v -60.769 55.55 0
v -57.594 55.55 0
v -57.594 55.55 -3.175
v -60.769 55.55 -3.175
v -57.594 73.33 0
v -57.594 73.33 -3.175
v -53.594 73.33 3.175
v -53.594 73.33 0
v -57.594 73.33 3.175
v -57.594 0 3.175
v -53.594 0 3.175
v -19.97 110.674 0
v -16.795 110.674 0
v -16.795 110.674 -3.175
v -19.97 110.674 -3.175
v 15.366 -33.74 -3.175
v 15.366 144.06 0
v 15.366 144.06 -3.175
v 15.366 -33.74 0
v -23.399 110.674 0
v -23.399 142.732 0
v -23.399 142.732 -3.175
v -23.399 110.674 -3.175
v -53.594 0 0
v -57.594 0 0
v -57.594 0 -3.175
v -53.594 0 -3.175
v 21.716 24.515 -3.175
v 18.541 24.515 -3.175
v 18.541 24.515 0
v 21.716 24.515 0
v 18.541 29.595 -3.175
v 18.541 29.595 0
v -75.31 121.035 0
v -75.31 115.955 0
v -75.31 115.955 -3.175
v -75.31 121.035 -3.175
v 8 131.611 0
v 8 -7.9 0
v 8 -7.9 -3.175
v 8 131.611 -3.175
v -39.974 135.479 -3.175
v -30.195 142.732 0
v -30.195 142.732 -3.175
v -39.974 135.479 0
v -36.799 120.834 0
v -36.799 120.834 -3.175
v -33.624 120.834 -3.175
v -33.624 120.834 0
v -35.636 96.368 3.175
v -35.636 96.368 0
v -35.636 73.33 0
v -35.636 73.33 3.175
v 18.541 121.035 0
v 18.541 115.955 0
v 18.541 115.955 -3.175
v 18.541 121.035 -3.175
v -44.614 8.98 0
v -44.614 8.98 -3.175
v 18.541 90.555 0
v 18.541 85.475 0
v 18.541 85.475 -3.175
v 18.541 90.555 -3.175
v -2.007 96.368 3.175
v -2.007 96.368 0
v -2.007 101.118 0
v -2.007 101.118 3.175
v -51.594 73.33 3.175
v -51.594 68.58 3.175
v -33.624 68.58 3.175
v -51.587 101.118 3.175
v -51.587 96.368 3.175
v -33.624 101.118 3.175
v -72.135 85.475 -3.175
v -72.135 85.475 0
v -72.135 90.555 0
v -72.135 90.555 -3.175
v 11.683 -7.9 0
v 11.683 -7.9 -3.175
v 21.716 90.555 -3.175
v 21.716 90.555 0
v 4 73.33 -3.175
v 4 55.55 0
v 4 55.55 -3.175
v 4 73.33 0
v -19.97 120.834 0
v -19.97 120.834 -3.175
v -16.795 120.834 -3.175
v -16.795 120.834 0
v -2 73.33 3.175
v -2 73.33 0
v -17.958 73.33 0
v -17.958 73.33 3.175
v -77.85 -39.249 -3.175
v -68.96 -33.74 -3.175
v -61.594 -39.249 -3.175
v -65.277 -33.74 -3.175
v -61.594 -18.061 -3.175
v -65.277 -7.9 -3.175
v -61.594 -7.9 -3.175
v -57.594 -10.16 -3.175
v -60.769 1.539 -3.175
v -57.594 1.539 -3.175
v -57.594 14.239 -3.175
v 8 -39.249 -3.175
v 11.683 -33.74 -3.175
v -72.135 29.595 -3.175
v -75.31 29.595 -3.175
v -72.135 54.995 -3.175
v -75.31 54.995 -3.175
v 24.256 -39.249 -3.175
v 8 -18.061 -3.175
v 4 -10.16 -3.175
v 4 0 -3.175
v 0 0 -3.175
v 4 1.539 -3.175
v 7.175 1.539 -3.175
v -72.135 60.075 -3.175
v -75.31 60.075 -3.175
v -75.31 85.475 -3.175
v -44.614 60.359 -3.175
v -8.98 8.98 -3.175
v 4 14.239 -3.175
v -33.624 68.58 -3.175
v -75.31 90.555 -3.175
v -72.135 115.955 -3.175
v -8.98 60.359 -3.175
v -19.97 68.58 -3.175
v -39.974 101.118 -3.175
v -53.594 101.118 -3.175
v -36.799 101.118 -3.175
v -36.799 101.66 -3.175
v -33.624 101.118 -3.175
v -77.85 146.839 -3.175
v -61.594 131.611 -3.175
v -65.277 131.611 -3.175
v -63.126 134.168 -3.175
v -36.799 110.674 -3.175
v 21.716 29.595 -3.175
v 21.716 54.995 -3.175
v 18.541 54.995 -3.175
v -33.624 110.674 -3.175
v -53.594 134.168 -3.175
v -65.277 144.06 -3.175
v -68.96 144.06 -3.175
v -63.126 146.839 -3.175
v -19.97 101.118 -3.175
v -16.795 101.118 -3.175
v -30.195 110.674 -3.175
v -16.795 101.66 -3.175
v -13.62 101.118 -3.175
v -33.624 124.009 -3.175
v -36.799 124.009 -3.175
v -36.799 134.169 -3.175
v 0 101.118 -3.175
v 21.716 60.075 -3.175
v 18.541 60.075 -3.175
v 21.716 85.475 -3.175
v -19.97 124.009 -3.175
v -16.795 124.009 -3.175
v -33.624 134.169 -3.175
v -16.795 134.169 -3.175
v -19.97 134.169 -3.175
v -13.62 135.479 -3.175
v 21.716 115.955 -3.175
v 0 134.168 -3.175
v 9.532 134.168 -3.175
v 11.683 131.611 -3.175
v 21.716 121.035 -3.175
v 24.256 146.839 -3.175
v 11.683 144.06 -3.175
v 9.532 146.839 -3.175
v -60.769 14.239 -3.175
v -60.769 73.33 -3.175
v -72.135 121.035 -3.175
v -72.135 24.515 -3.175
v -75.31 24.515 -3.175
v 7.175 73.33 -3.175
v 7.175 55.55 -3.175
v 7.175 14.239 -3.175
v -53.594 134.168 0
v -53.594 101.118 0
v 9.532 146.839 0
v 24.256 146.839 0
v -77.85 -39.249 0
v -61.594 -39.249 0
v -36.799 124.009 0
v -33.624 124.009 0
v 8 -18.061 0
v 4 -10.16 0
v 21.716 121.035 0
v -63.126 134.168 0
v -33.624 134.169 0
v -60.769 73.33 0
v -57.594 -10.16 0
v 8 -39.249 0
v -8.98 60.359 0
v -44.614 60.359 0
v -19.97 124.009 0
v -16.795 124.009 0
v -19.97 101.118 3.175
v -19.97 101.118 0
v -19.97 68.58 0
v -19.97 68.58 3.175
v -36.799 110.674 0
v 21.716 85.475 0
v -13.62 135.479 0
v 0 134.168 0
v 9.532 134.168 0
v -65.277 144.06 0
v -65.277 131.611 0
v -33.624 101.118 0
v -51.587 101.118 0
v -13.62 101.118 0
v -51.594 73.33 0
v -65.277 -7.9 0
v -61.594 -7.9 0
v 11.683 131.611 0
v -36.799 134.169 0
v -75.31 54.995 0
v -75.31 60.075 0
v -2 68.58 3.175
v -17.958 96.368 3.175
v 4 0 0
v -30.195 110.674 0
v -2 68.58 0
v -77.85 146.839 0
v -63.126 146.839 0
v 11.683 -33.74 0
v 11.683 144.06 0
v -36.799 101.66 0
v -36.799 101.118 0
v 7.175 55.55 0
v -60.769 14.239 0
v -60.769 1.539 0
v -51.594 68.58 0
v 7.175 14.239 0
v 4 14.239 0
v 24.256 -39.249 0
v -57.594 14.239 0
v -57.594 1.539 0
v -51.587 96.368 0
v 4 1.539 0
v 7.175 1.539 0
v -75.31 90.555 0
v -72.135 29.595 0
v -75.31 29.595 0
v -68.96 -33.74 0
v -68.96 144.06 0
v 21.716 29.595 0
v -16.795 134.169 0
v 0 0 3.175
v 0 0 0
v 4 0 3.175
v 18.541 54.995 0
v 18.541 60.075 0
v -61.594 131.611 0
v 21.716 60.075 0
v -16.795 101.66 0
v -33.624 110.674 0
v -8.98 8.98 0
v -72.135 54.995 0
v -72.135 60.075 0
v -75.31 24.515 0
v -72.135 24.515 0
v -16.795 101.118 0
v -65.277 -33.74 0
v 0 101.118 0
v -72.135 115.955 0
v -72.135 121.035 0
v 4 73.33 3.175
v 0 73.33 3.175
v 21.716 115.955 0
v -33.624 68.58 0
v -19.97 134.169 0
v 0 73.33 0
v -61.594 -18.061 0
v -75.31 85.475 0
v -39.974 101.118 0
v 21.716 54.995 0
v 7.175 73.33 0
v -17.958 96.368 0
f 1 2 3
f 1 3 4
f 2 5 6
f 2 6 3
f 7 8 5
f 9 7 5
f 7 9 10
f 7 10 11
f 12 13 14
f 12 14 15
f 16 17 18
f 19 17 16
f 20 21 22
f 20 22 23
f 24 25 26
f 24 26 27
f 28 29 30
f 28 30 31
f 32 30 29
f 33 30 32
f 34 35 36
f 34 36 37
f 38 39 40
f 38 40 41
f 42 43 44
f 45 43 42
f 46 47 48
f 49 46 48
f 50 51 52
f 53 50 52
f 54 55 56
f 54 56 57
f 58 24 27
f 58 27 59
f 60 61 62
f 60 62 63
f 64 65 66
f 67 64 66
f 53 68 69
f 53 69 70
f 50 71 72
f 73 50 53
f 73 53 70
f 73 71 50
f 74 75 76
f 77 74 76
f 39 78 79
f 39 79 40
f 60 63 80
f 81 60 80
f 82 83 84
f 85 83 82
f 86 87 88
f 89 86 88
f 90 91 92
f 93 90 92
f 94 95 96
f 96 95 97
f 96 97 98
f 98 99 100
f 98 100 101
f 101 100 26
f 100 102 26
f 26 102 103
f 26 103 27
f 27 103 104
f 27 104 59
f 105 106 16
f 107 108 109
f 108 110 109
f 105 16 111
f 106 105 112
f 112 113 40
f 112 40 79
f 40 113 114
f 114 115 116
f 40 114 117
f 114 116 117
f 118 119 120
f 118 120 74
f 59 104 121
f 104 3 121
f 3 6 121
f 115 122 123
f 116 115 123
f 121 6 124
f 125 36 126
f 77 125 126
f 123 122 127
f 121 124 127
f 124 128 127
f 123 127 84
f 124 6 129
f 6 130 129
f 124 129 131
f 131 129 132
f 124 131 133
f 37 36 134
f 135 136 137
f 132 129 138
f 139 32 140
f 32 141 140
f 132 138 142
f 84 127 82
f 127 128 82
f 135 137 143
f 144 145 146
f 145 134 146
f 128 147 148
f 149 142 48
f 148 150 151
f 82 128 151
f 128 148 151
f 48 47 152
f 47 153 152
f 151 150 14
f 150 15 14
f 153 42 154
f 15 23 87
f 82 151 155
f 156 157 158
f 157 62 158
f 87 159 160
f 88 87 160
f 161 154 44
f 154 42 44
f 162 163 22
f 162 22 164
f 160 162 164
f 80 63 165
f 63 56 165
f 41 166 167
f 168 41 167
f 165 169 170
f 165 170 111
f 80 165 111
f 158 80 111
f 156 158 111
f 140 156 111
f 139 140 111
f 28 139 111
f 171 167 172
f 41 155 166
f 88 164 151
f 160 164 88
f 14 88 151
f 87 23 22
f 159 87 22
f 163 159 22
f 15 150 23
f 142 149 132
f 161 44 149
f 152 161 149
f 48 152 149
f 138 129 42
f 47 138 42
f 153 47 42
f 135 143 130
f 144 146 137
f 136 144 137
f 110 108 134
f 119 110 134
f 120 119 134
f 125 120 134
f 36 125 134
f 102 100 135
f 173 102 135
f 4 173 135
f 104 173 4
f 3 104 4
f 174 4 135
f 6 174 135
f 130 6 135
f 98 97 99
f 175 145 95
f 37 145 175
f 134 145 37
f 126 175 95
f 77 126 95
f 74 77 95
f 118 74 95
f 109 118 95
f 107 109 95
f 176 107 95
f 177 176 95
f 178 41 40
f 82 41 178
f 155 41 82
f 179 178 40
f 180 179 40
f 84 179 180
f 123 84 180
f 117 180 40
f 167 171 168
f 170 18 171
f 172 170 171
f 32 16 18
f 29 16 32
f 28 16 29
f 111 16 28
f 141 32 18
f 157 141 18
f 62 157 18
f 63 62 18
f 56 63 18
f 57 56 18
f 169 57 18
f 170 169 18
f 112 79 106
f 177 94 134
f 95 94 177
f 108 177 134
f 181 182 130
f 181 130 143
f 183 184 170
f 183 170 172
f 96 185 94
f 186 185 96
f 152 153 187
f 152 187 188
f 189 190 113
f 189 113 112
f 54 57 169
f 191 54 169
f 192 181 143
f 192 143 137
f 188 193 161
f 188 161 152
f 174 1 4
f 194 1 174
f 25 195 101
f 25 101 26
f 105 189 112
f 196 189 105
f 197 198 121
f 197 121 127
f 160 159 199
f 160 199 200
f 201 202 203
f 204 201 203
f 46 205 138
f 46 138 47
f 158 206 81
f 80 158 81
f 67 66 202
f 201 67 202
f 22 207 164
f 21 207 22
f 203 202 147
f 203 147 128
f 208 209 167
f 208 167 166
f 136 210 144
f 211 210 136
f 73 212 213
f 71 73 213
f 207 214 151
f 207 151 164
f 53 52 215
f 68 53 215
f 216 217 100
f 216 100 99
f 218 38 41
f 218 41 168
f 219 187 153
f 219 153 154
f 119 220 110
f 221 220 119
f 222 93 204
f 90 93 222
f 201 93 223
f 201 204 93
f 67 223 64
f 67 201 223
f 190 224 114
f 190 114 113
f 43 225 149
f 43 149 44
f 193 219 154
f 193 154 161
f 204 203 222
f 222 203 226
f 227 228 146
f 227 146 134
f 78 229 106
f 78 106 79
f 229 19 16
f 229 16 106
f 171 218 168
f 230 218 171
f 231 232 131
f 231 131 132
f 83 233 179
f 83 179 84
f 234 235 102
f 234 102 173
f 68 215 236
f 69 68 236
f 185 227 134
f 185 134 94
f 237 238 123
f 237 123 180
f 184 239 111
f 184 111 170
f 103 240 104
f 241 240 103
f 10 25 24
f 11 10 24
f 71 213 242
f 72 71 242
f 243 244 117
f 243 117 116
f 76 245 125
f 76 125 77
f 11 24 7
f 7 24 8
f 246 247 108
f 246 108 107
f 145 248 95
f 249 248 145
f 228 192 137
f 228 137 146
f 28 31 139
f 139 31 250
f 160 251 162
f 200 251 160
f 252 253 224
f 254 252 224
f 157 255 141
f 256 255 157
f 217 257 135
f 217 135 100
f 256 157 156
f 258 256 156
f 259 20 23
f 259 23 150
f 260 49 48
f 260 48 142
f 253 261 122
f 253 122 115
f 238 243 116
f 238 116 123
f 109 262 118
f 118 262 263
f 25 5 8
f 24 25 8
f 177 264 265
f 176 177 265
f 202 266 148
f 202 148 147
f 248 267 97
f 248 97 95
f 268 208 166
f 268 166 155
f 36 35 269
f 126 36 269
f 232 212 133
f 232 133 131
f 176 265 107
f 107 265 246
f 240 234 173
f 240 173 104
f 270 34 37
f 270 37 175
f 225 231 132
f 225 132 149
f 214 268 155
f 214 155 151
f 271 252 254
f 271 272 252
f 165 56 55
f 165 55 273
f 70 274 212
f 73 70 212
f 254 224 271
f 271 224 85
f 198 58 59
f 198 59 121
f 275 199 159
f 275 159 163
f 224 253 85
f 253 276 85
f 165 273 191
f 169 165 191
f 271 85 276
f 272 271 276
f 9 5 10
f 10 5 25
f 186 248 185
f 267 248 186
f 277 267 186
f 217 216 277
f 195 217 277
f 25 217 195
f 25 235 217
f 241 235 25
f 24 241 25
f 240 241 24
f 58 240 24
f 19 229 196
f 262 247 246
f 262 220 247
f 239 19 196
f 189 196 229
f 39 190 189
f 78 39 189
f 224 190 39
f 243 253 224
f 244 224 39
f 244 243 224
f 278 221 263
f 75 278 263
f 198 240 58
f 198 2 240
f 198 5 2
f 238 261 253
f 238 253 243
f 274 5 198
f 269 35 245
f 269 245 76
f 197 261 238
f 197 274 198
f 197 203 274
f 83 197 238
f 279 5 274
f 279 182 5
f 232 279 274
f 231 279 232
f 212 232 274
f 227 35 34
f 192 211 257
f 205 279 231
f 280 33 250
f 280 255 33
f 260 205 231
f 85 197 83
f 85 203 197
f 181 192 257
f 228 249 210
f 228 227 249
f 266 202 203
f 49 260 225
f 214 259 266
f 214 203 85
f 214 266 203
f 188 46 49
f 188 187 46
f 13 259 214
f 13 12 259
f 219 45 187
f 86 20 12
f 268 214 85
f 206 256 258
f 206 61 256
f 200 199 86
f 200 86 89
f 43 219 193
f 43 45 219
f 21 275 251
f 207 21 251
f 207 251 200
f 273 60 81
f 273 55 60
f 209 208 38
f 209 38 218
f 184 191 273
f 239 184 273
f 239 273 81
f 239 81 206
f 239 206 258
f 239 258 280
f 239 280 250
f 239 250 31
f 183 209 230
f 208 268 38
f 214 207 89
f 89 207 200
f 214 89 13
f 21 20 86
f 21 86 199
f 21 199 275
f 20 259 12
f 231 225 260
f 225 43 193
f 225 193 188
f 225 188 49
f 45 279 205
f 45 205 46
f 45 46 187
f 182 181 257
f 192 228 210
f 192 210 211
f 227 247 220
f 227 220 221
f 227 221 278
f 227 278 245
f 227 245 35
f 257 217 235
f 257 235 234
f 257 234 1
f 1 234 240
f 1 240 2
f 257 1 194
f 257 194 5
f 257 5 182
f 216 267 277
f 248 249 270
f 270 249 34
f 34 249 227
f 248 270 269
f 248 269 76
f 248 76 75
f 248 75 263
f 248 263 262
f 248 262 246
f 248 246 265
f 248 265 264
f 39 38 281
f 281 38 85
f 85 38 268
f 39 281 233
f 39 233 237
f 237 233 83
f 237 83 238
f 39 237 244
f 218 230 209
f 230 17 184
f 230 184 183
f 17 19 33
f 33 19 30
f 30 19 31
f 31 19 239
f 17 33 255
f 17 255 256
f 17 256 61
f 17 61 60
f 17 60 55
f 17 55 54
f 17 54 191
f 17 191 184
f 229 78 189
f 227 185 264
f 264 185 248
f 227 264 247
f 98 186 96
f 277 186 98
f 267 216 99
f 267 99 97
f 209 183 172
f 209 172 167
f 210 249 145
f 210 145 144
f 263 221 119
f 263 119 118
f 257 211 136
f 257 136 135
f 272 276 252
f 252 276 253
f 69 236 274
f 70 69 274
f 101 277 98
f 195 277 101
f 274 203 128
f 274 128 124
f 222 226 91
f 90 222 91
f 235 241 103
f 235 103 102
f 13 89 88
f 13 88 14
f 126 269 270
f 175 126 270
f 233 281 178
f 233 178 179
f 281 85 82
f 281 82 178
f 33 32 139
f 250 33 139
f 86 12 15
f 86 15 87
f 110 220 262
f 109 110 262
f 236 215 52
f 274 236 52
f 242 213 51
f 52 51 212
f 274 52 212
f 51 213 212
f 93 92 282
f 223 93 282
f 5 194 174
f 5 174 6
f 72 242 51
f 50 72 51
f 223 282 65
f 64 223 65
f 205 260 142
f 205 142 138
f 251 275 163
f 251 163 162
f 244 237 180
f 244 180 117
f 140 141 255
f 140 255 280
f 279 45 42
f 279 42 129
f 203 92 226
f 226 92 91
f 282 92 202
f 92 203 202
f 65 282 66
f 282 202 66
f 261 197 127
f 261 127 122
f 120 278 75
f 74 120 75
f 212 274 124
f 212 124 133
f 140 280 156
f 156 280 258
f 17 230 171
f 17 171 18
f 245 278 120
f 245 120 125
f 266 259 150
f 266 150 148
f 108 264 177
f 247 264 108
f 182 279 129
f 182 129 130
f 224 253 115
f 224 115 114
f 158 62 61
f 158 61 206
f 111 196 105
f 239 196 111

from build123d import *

# Parameters (mm, degrees)
F0_W     = 3.175
F0_H     = 5.08
F0_W_2   = 2.0066
F0_H_2   = 4.7498
F0_W_3   = 1.999996
F0_H_3   = 4.7500032
F0_H_4   = 3.175
F1_DEPTH = 3.175
F2_DEPTH = 3.175


with BuildPart() as f1:
    # F0 (on Top) → F1 (new body)
    with BuildSketch(Plane.XY):
        Polygon((-57.593992, 73.3300032), (-53.594, 73.3300032), (-53.594, 96.3678032), (-53.594, 101.1176032), (-53.594, 134.1682225466), (-63.1263878722, 134.1682225466), (-63.1263878722, 146.8389332294), (-77.8500348, 146.8389332294), (-77.8500348, -30.2285756916), (-68.9600348, -30.2285756916), (-68.9600348, 0), (-68.9600348, 24.5148862), (-68.9600348, 144.0596636616), (-65.2770348, 144.0596636616), (-65.2770348, 131.6107958555), (-61.5940348, 131.6107958555), (-61.5940348, 73.3300032), (-60.768992, 73.3300032), align=None)
        with Locations((-73.7225348, 27.0548862)):
            Rectangle(F0_W, F0_H, mode=Mode.SUBTRACT)
        with Locations((-73.7225348, 57.5348862)):
            Rectangle(F0_W, F0_H, mode=Mode.SUBTRACT)
        with Locations((-73.7225348, 88.0148862)):
            Rectangle(F0_W, F0_H, mode=Mode.SUBTRACT)
        with Locations((-73.7225348, 118.4948862)):
            Rectangle(F0_W, F0_H, mode=Mode.SUBTRACT)
        Polygon((-53.594, 0), (-53.594, 68.58), (-53.594, 73.3300032), (-57.593992, 73.3300032), (-57.593992, 55.5500032), (-57.593992, 14.2394178), (-57.593992, 1.5394178), (-57.593992, 0), align=None)
        Polygon((-61.5940348, 0), (-57.593992, 0), (-57.593992, 1.5394178), (-60.768992, 1.5394178), (-60.768992, 14.2394178), (-57.593992, 14.2394178), (-57.593992, 55.5500032), (-60.768992, 55.5500032), (-60.768992, 73.3300032), (-61.5940348, 73.3300032), align=None)
        Polygon((-57.593992, -10.1604700894), (-57.593992, 0), (-61.5940348, -7.9003575384), (-65.2770348, -7.9003575384), (-65.2770348, -33.7403363384), (-65.2770348, -39.24895823), (-61.5940348, -39.24895823), (-61.5940348, -18.0608276278), align=None)
        Polygon((-61.5940348, -7.9003575384), (-57.593992, 0), (-61.5940348, 0), align=None)
        Polygon((-65.2770348, -39.24895823), (-65.2770348, -33.7403363384), (-68.9600348, -33.7403363384), (-68.9600348, -30.2285756916), (-77.8500348, -30.2285756916), (-77.8500348, -39.24895823), align=None)
        Polygon((-51.594004, 68.58), (-53.594, 68.58), (-53.594, 0), (-44.6137438789, 8.9802561211), (-44.6137438789, 60.3592395782), (-44.6137438789, 68.58), align=None)
        Polygon((-33.6244356733, 68.58), (-44.6137438789, 68.58), (-44.6137438789, 60.3592395782), (-26.797, 60.3592395782), (-26.797, 68.58), align=None)
        Polygon((-51.594004, 73.3300032), (-51.594004, 68.58), (-44.6137438789, 68.58), (-33.6244356733, 68.58), (-33.6244356733, 90.795443326), (-33.6244356733, 101.1176032), (-36.7994356733, 101.1176032), (-39.9744356733, 101.1176032), (-51.5874, 101.1176032), (-51.5874, 96.3678032), (-35.6362, 96.3678032), (-35.6362, 73.3300032), align=None)
        Polygon((-53.594, 96.3678032), (-53.594, 73.3300032), (-51.594004, 73.3300032), (-35.6362, 73.3300032), (-35.6362, 96.3678032), (-51.5874, 96.3678032), align=None)
        with Locations((-52.5907, 98.7427032)):
            Rectangle(F0_W_2, F0_H_2)
        with Locations((-52.594002, 70.9550016)):
            Rectangle(F0_W_3, F0_H_3)
        Polygon((-26.797, 68.58), (-26.797, 60.3592395782), (-8.9802561211, 60.3592395782), (-8.9802561211, 68.58), (-19.9695643267, 68.58), align=None)
        Polygon((-8.9802561211, 8.9802561211), (0, 0), (0, 68.58), (-1.999996, 68.58), (-8.9802561211, 68.58), (-8.9802561211, 60.3592395782), align=None)
        Polygon((-19.9695643267, 90.795443326), (-19.9695643267, 68.58), (-8.9802561211, 68.58), (-1.999996, 68.58), (-1.999996, 73.3300032), (-17.9578, 73.3300032), (-17.9578, 96.3678032), (-2.0066, 96.3678032), (-2.0066, 101.1176032), (-13.6195643267, 101.1176032), (-16.7945643267, 101.1176032), (-19.9695643267, 101.1176032), align=None)
        Polygon((-1.999996, 73.3300032), (0, 73.3300032), (0, 96.3678032), (-2.0066, 96.3678032), (-17.9578, 96.3678032), (-17.9578, 73.3300032), align=None)
        with Locations((-1.0033, 98.7427032)):
            Rectangle(F0_W_2, F0_H_2)
        with Locations((-0.999998, 70.9550016)):
            Rectangle(F0_W_3, F0_H_3)
        Polygon((0, 68.58), (0, 0), (3.999992, 0), (3.999992, 1.5394178), (3.999992, 14.2394178), (3.999992, 55.5500032), (3.999992, 73.3300032), (0, 73.3300032), align=None)
        Polygon((0, 96.3678032), (0, 73.3300032), (3.999992, 73.3300032), (7.174992, 73.3300032), (8.0000348, 73.3300032), (8.0000348, 131.6107958555), (11.6830348, 131.6107958555), (11.6830348, 144.0596636616), (15.3660348, 144.0596636616), (15.3660348, 24.5148862), (15.3660348, 0), (15.3660348, -30.2285756916), (24.2560348, -30.2285756916), (24.2560348, 146.8389332294), (9.5323878722, 146.8389332294), (9.5323878722, 134.1682225466), (0, 134.1682225466), (0, 101.1176032), align=None)
        with Locations((20.1285348, 27.0548862)):
            Rectangle(F0_W, F0_H, mode=Mode.SUBTRACT)
        with Locations((20.1285348, 57.5348862)):
            Rectangle(F0_W, F0_H, mode=Mode.SUBTRACT)
        with Locations((20.1285348, 88.0148862)):
            Rectangle(F0_W, F0_H, mode=Mode.SUBTRACT)
        with Locations((20.1285348, 118.4948862)):
            Rectangle(F0_W, F0_H, mode=Mode.SUBTRACT)
        Polygon((3.999992, 1.5394178), (3.999992, 0), (8.0000348, 0), (8.0000348, 73.3300032), (7.174992, 73.3300032), (7.174992, 55.5500032), (3.999992, 55.5500032), (3.999992, 14.2394178), (7.174992, 14.2394178), (7.174992, 1.5394178), align=None)
        Polygon((15.3660348, -33.7403363384), (11.6830348, -33.7403363384), (11.6830348, -39.24895823), (24.2560348, -39.24895823), (24.2560348, -30.2285756916), (15.3660348, -30.2285756916), align=None)
        Polygon((8.0000348, -7.9003575384), (3.999992, 0), (3.999992, -10.1604700894), (8.0000348, -18.0608276278), (8.0000348, -39.24895823), (11.6830348, -39.24895823), (11.6830348, -33.7403363384), (11.6830348, -7.9003575384), align=None)
        Polygon((8.0000348, 0), (3.999992, 0), (8.0000348, -7.9003575384), align=None)
        Polygon((-36.7994356733, 110.6742616482), (-36.7994356733, 101.6604336215), (-30.1954356733, 110.6742616482), (-33.6244356733, 110.6742616482), align=None)
        Polygon((-39.9744356733, 135.4787051678), (-39.9744356733, 101.1176032), (-36.7994356733, 101.1176032), (-36.7994356733, 101.6604336215), (-36.7994356733, 110.6742616482), (-36.7994356733, 120.8342616482), (-36.7994356733, 124.0092616482), (-36.7994356733, 134.1692616482), (-33.6244356733, 134.1692616482), (-33.6244356733, 124.0092616482), (-33.6244356733, 120.8342616482), (-33.6244356733, 110.6742616482), (-30.1954356733, 110.6742616482), (-30.1954356733, 142.732039094), align=None)
        with Locations((-35.2119356733, 122.4217616482)):
            Rectangle(F0_W, F0_H_4)
        with Locations((-18.3820643267, 122.4217616482)):
            Rectangle(F0_W, F0_H_4)
        Polygon((-16.7945643267, 101.6604336215), (-16.7945643267, 101.1176032), (-13.6195643267, 101.1176032), (-13.6195643267, 135.4787051678), (-23.3985643267, 142.732039094), (-23.3985643267, 110.6742616482), (-19.9695643267, 110.6742616482), (-19.9695643267, 120.8342616482), (-19.9695643267, 124.0092616482), (-19.9695643267, 134.1692616482), (-16.7945643267, 134.1692616482), (-16.7945643267, 124.0092616482), (-16.7945643267, 120.8342616482), (-16.7945643267, 110.6742616482), align=None)
        Polygon((-23.3985643267, 110.6742616482), (-16.7945643267, 101.6604336215), (-16.7945643267, 110.6742616482), (-19.9695643267, 110.6742616482), align=None)
    extrude(amount=-F1_DEPTH)


with BuildPart() as f2:
    # F0 (on Top) → F2 (new body)
    with BuildSketch(Plane.XY):
        Polygon((0, 68.58), (0, 0), (3.999992, 0), (3.999992, 1.5394178), (3.999992, 14.2394178), (3.999992, 55.5500032), (3.999992, 73.3300032), (0, 73.3300032), align=None)
    extrude(amount=F2_DEPTH)


with BuildPart() as f2b:
    # F0 (on Top) → F2, piece 2 (new body)
    with BuildSketch(Plane.XY):
        Polygon((-19.9695643267, 90.795443326), (-19.9695643267, 68.58), (-8.9802561211, 68.58), (-1.999996, 68.58), (-1.999996, 73.3300032), (-17.9578, 73.3300032), (-17.9578, 96.3678032), (-2.0066, 96.3678032), (-2.0066, 101.1176032), (-13.6195643267, 101.1176032), (-16.7945643267, 101.1176032), (-19.9695643267, 101.1176032), align=None)
    extrude(amount=F2_DEPTH)


with BuildPart() as f2c:
    # F0 (on Top) → F2, piece 3 (new body)
    with BuildSketch(Plane.XY):
        Polygon((-51.594004, 73.3300032), (-51.594004, 68.58), (-44.6137438789, 68.58), (-33.6244356733, 68.58), (-33.6244356733, 90.795443326), (-33.6244356733, 101.1176032), (-36.7994356733, 101.1176032), (-39.9744356733, 101.1176032), (-51.5874, 101.1176032), (-51.5874, 96.3678032), (-35.6362, 96.3678032), (-35.6362, 73.3300032), align=None)
    extrude(amount=F2_DEPTH)


with BuildPart() as f2d:
    # F0 (on Top) → F2, piece 4 (new body)
    with BuildSketch(Plane.XY):
        Polygon((-53.594, 0), (-53.594, 68.58), (-53.594, 73.3300032), (-57.593992, 73.3300032), (-57.593992, 55.5500032), (-57.593992, 14.2394178), (-57.593992, 1.5394178), (-57.593992, 0), align=None)
    extrude(amount=F2_DEPTH)


solid = Compound([f1.part, f2.part, f2b.part, f2c.part, f2d.part])
